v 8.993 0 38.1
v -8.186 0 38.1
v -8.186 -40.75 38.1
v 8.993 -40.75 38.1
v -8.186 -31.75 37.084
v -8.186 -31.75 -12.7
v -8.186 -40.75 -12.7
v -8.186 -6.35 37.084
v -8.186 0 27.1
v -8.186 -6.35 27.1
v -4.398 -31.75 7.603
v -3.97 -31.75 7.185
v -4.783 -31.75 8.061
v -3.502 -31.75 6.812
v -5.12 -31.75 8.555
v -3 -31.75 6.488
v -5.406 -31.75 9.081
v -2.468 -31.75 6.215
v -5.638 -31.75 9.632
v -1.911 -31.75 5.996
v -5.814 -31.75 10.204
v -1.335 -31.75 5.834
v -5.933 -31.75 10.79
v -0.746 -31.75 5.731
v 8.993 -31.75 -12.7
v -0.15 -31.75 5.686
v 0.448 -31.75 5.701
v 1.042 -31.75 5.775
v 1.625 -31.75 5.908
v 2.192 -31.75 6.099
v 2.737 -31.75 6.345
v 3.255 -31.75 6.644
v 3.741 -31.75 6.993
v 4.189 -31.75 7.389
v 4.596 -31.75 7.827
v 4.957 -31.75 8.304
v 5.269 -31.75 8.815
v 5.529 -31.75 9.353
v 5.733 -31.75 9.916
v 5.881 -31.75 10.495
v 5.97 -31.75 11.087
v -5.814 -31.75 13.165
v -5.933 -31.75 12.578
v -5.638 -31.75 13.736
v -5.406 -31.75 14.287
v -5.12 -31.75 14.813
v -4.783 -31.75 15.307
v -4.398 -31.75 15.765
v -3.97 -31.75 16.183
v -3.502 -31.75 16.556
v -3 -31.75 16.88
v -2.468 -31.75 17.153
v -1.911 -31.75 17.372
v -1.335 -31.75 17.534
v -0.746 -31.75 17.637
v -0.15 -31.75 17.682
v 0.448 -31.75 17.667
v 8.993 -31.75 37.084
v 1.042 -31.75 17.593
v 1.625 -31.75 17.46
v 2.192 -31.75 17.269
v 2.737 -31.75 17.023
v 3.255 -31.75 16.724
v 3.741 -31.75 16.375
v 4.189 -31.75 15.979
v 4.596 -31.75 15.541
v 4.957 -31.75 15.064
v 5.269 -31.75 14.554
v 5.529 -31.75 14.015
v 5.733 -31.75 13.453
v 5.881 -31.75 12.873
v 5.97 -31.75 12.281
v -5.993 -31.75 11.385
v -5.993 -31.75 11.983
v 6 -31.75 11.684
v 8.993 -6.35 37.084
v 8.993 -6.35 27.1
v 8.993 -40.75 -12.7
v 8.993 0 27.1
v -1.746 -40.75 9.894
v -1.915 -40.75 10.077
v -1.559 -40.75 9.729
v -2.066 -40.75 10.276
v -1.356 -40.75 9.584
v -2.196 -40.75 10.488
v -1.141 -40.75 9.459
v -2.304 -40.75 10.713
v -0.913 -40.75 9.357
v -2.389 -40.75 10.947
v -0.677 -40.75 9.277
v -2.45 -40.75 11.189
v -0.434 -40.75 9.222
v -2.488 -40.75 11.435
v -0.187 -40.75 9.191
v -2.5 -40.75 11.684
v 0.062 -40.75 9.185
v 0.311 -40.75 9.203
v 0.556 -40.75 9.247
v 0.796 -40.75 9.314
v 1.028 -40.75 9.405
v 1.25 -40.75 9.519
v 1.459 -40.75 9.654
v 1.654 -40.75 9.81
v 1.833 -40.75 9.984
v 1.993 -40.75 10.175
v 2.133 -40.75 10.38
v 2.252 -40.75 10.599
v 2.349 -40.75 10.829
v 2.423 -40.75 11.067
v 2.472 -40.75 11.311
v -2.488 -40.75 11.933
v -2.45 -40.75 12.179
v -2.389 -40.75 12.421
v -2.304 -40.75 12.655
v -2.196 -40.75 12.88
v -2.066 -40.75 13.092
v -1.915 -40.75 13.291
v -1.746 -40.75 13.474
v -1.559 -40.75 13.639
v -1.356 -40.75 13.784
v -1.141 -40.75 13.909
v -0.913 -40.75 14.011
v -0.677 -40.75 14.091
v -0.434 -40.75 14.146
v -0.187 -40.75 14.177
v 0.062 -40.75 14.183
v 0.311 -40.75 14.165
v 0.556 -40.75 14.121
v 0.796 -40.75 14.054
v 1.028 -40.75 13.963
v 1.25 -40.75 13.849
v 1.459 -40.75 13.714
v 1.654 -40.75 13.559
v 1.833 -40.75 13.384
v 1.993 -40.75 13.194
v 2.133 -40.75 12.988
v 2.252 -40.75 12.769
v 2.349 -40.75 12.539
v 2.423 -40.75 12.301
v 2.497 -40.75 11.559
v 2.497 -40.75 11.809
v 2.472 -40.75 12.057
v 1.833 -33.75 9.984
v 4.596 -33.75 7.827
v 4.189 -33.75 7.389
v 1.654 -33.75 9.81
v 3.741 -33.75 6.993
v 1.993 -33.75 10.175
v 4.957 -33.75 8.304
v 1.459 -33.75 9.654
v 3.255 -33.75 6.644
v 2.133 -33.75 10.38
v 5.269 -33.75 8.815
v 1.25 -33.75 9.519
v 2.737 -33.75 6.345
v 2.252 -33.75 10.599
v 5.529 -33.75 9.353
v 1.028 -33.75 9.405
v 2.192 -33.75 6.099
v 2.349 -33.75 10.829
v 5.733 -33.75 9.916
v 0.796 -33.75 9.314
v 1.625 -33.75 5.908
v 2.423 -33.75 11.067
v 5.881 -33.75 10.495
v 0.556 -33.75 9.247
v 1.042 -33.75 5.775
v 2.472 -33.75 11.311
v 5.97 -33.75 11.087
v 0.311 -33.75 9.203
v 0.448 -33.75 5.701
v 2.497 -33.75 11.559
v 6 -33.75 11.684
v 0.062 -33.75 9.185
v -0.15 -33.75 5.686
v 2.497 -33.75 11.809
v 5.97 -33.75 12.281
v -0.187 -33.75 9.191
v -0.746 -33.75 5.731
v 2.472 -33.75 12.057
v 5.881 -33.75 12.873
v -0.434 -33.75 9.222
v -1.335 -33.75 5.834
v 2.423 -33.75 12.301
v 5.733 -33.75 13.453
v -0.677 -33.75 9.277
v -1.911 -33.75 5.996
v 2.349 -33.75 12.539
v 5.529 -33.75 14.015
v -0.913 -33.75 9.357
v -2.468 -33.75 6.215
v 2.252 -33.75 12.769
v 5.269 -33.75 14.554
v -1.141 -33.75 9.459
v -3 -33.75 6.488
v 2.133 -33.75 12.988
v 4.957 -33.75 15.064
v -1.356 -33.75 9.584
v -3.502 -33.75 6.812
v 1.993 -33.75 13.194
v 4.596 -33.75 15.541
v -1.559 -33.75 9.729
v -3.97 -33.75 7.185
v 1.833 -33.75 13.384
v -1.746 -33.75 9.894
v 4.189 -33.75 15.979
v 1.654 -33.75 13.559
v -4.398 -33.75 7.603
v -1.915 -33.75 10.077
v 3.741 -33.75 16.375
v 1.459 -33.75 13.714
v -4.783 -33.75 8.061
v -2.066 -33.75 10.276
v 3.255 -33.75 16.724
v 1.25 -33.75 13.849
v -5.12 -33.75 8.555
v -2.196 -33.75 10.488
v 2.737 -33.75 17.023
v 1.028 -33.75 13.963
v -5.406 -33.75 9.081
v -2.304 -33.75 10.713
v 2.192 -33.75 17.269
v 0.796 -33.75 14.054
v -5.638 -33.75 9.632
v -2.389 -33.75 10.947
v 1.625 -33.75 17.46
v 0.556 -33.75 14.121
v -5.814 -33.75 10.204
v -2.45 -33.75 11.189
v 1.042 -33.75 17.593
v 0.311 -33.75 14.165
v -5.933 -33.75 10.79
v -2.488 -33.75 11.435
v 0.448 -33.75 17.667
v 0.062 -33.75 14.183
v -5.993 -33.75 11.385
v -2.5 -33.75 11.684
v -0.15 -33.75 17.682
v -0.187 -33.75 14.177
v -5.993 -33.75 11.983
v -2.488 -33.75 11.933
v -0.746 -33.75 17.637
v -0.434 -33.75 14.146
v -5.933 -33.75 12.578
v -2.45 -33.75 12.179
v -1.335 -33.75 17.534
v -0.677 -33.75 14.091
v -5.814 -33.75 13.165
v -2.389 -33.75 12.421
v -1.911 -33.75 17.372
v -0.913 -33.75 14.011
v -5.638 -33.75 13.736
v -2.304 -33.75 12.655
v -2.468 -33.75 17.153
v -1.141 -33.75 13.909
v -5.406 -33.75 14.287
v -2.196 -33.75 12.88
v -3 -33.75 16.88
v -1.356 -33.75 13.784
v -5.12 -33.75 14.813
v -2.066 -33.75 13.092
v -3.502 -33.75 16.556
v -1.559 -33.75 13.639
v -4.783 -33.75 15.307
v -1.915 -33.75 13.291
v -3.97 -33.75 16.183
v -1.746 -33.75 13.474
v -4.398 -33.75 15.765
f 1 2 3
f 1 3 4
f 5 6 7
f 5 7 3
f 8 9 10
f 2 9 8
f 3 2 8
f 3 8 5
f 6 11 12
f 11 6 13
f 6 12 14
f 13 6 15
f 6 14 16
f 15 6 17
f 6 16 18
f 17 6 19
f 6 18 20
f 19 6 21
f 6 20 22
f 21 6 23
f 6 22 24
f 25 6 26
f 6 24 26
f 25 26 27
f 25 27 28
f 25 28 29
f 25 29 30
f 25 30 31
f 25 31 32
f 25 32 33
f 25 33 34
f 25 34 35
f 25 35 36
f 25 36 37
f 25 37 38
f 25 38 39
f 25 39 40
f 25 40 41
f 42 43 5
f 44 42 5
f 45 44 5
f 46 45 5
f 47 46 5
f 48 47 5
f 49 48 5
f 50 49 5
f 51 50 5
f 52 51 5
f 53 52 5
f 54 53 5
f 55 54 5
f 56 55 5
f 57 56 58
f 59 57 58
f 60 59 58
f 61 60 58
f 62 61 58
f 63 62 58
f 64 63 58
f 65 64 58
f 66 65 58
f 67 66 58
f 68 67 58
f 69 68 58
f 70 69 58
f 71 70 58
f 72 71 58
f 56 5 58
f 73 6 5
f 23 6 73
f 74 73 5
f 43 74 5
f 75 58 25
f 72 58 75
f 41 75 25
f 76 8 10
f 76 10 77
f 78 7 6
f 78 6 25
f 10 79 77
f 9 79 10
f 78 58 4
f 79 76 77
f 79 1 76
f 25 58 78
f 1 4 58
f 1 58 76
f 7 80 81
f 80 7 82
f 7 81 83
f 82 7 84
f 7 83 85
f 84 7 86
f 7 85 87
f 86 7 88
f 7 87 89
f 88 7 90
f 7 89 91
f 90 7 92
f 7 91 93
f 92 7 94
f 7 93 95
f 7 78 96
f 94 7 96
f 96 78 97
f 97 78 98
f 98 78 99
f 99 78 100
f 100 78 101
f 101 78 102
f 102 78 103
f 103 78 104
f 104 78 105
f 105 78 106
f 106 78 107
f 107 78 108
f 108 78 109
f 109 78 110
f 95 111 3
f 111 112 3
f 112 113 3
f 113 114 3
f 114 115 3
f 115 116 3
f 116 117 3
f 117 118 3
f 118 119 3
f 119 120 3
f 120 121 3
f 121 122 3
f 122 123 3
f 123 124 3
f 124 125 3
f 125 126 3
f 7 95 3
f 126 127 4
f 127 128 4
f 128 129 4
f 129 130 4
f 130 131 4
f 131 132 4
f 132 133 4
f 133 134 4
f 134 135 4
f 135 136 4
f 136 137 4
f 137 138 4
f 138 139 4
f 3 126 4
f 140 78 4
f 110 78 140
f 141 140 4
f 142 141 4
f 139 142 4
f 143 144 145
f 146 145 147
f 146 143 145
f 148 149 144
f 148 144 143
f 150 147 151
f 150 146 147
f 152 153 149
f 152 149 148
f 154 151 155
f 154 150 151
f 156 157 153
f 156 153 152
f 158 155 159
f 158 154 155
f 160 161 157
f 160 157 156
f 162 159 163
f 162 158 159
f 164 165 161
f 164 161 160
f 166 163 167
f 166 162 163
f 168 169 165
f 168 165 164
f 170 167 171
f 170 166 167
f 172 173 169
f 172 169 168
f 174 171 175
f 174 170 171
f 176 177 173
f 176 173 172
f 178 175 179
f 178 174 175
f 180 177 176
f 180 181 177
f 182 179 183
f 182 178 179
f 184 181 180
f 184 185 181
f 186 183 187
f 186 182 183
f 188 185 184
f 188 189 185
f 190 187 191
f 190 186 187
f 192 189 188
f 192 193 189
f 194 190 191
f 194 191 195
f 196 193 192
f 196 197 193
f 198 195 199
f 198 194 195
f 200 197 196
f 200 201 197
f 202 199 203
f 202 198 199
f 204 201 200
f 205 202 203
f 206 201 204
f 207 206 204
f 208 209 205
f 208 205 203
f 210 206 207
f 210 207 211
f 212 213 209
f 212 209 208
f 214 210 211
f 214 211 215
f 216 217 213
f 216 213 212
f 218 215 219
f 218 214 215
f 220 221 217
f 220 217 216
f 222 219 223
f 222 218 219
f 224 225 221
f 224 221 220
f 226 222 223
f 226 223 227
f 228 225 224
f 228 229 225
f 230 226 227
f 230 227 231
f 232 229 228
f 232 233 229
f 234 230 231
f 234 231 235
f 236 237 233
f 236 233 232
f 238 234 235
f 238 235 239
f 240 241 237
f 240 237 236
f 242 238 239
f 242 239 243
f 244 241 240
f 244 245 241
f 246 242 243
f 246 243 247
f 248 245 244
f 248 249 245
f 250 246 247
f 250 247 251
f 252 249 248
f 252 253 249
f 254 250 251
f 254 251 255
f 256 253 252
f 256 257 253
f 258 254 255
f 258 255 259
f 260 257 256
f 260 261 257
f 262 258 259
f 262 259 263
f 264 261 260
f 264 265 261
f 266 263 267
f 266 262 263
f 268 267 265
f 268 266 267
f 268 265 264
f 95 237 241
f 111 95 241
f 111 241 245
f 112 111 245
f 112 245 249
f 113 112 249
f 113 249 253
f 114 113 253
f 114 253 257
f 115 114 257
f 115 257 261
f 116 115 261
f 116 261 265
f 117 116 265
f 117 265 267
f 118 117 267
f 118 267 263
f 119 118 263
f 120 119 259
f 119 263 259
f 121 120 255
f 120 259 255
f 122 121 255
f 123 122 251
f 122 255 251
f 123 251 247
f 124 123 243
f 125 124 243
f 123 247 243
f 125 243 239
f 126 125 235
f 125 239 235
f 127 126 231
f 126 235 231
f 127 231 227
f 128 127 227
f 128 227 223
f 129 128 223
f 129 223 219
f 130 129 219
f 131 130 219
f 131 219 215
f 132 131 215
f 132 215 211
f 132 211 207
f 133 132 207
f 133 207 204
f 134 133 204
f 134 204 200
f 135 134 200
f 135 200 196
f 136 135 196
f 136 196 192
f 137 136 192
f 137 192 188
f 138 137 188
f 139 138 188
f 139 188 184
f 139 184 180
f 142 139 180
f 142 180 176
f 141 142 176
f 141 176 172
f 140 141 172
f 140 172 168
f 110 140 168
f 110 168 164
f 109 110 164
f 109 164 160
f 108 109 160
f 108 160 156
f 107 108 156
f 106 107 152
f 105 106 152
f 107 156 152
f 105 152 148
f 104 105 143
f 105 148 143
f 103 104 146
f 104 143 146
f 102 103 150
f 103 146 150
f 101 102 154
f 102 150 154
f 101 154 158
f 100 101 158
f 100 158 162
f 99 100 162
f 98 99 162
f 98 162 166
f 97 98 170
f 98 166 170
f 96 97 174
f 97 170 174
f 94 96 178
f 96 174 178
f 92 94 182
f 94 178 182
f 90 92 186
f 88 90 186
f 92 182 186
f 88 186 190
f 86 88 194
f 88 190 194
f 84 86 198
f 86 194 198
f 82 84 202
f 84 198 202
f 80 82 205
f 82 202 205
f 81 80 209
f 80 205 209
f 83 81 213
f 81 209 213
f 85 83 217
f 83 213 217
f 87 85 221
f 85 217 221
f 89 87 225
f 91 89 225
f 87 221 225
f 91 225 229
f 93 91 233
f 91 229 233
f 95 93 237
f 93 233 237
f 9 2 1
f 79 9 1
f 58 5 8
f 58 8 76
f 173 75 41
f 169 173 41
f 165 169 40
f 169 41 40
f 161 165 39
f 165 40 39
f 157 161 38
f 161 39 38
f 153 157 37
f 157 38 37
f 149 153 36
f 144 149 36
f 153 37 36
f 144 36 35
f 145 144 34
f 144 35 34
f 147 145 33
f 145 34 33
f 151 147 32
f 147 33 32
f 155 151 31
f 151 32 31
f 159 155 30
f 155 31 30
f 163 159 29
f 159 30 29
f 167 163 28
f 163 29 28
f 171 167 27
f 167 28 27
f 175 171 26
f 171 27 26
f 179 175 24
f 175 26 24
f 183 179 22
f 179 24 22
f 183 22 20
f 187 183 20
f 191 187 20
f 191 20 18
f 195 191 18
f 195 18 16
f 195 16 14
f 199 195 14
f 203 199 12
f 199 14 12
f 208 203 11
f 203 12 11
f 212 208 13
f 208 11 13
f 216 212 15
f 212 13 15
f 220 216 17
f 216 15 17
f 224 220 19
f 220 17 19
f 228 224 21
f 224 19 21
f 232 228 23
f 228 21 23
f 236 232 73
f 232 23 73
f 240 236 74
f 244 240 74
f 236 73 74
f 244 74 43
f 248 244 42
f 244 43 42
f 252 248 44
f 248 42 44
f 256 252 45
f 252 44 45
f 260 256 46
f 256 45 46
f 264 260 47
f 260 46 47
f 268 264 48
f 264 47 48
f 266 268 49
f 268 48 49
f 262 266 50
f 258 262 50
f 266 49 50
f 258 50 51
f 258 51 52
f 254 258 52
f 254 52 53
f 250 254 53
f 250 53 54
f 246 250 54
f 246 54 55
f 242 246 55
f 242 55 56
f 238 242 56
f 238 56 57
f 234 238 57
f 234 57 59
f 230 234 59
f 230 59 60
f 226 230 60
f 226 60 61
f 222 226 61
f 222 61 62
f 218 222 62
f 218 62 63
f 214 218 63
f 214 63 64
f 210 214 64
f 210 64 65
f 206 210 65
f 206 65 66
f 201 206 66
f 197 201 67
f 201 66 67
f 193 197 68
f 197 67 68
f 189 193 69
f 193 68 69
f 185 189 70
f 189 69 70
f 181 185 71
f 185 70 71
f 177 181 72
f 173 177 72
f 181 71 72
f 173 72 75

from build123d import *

# Parameters (mm, degrees)
F0_W      = 50.8
F0_H      = 76.2
F1_DEPTH  = 50.8
F2_W      = 118.1567646563
F2_H      = 84.5074988902
F3_DEPTH  = 25.4
F7_W      = 50.8
F7_H      = 65.2
F8_DEPTH  = 25.4
F10_DEPTH = 2
F11_R     = 2.5
F12_DEPTH = 25.4
F13_W     = 50.8
F13_H     = 25.4
F14_DEPTH = 25.4
F16_DEPTH = 76.2
F17_W     = 20.6161607057
F17_H     = 59.5903657377
F18_DEPTH = 50.8
F19_W     = 15.1074826717
F19_H     = 54.0688689798
F20_DEPTH = 12.7
F21_DEPTH = 12.7


with BuildPart() as f1:
    # F0 (on Front) → F1 (new body)
    with BuildSketch(Plane.XZ):
        Rectangle(F0_W, F0_H)
    extrude(amount=F1_DEPTH)


with BuildPart() as f3:
    # F2 (on Front) → F3 (new body)
    with BuildSketch(Plane.XZ):
        with Locations((1.1794324964, -5.1696989685)):
            Rectangle(F2_W, F2_H)
    extrude(amount=F3_DEPTH)


with BuildPart() as f3_1:
    # F4: moved
    add(f3.part.moved(Location((0, -6.35, 0))))


with BuildPart() as f1_1:
    add(f1.part)

    # F5: cut F3
    add(f3_1.part, mode=Mode.SUBTRACT)

    # F7 (on face) → F8 (cut)
    with BuildSketch(Plane(origin=(0, 0, 0), x_dir=(-1, 0, 0), z_dir=(0, 1, 0))):
        with Locations((0, -5.5)):
            Rectangle(F7_W, F7_H)
    extrude(amount=-F8_DEPTH, mode=Mode.SUBTRACT)

    # F9 (on face) → F10 (cut)
    with BuildSketch(Plane(origin=(0, -31.75, 0), x_dir=(-1, 0, 0), z_dir=(0, 1, 0))):
        with BuildLine():
            Line((-6, 11.6840504766), (6, 11.6840504766))
            ThreePointArc((6, 11.6840504766), (0, 17.6840504766), (-6, 11.6840504766))
        make_face()
        with BuildLine():
            ThreePointArc((-6, 11.6840504766), (0, 5.6840504766), (6, 11.6840504766))
            Line((6, 11.6840504766), (-6, 11.6840504766))
        make_face()
    extrude(amount=-F10_DEPTH, mode=Mode.SUBTRACT)

    # F11 (on face) → F12 (cut)
    with BuildSketch(Plane(origin=(0, -31.75, 0), x_dir=(-1, 0, 0), z_dir=(0, 1, 0))):
        with Locations((0, 11.6840504766)):
            Circle(F11_R)
    extrude(amount=-F12_DEPTH, mode=Mode.SUBTRACT)

    # F13 (on face) → F14 (cut)
    with BuildSketch(Plane.XZ.offset(50.8)):
        with Locations((0, -25.4)):
            Rectangle(F13_W, F13_H)
    extrude(amount=-F14_DEPTH, mode=Mode.SUBTRACT)

    # F15 (on Front) → F16 (cut)
    with BuildSketch(Plane.XZ):
        Polygon((28.8663152605, 38.4073257446), (8.9931758121, 38.4073257446), (8.9931758121, -14.9972904474), (32.6694212854, -14.9972904474), (32.6694212854, 38.4073257446), align=None)
    extrude(amount=F16_DEPTH, mode=Mode.SUBTRACT)

    # F17 (on Front) → F18 (cut)
    with BuildSketch(Plane.XZ):
        with Locations((-18.4944430366, 13.4912934154)):
            Rectangle(F17_W, F17_H)
    extrude(amount=F18_DEPTH, mode=Mode.SUBTRACT)

    # F19 (on Right) → F20 (cut)
    with BuildSketch(Plane.YZ):
        with Locations((-48.3041740954, 12.0263481513)):
            Rectangle(F19_W, F19_H)
    extrude(amount=-F20_DEPTH, mode=Mode.SUBTRACT)

    # F19 (on Right) → F21 (cut)
    with BuildSketch(Plane.YZ):
        with Locations((-48.3041740954, 12.0263481513)):
            Rectangle(F19_W, F19_H)
    extrude(amount=F21_DEPTH, mode=Mode.SUBTRACT)


solid = f1_1.part
